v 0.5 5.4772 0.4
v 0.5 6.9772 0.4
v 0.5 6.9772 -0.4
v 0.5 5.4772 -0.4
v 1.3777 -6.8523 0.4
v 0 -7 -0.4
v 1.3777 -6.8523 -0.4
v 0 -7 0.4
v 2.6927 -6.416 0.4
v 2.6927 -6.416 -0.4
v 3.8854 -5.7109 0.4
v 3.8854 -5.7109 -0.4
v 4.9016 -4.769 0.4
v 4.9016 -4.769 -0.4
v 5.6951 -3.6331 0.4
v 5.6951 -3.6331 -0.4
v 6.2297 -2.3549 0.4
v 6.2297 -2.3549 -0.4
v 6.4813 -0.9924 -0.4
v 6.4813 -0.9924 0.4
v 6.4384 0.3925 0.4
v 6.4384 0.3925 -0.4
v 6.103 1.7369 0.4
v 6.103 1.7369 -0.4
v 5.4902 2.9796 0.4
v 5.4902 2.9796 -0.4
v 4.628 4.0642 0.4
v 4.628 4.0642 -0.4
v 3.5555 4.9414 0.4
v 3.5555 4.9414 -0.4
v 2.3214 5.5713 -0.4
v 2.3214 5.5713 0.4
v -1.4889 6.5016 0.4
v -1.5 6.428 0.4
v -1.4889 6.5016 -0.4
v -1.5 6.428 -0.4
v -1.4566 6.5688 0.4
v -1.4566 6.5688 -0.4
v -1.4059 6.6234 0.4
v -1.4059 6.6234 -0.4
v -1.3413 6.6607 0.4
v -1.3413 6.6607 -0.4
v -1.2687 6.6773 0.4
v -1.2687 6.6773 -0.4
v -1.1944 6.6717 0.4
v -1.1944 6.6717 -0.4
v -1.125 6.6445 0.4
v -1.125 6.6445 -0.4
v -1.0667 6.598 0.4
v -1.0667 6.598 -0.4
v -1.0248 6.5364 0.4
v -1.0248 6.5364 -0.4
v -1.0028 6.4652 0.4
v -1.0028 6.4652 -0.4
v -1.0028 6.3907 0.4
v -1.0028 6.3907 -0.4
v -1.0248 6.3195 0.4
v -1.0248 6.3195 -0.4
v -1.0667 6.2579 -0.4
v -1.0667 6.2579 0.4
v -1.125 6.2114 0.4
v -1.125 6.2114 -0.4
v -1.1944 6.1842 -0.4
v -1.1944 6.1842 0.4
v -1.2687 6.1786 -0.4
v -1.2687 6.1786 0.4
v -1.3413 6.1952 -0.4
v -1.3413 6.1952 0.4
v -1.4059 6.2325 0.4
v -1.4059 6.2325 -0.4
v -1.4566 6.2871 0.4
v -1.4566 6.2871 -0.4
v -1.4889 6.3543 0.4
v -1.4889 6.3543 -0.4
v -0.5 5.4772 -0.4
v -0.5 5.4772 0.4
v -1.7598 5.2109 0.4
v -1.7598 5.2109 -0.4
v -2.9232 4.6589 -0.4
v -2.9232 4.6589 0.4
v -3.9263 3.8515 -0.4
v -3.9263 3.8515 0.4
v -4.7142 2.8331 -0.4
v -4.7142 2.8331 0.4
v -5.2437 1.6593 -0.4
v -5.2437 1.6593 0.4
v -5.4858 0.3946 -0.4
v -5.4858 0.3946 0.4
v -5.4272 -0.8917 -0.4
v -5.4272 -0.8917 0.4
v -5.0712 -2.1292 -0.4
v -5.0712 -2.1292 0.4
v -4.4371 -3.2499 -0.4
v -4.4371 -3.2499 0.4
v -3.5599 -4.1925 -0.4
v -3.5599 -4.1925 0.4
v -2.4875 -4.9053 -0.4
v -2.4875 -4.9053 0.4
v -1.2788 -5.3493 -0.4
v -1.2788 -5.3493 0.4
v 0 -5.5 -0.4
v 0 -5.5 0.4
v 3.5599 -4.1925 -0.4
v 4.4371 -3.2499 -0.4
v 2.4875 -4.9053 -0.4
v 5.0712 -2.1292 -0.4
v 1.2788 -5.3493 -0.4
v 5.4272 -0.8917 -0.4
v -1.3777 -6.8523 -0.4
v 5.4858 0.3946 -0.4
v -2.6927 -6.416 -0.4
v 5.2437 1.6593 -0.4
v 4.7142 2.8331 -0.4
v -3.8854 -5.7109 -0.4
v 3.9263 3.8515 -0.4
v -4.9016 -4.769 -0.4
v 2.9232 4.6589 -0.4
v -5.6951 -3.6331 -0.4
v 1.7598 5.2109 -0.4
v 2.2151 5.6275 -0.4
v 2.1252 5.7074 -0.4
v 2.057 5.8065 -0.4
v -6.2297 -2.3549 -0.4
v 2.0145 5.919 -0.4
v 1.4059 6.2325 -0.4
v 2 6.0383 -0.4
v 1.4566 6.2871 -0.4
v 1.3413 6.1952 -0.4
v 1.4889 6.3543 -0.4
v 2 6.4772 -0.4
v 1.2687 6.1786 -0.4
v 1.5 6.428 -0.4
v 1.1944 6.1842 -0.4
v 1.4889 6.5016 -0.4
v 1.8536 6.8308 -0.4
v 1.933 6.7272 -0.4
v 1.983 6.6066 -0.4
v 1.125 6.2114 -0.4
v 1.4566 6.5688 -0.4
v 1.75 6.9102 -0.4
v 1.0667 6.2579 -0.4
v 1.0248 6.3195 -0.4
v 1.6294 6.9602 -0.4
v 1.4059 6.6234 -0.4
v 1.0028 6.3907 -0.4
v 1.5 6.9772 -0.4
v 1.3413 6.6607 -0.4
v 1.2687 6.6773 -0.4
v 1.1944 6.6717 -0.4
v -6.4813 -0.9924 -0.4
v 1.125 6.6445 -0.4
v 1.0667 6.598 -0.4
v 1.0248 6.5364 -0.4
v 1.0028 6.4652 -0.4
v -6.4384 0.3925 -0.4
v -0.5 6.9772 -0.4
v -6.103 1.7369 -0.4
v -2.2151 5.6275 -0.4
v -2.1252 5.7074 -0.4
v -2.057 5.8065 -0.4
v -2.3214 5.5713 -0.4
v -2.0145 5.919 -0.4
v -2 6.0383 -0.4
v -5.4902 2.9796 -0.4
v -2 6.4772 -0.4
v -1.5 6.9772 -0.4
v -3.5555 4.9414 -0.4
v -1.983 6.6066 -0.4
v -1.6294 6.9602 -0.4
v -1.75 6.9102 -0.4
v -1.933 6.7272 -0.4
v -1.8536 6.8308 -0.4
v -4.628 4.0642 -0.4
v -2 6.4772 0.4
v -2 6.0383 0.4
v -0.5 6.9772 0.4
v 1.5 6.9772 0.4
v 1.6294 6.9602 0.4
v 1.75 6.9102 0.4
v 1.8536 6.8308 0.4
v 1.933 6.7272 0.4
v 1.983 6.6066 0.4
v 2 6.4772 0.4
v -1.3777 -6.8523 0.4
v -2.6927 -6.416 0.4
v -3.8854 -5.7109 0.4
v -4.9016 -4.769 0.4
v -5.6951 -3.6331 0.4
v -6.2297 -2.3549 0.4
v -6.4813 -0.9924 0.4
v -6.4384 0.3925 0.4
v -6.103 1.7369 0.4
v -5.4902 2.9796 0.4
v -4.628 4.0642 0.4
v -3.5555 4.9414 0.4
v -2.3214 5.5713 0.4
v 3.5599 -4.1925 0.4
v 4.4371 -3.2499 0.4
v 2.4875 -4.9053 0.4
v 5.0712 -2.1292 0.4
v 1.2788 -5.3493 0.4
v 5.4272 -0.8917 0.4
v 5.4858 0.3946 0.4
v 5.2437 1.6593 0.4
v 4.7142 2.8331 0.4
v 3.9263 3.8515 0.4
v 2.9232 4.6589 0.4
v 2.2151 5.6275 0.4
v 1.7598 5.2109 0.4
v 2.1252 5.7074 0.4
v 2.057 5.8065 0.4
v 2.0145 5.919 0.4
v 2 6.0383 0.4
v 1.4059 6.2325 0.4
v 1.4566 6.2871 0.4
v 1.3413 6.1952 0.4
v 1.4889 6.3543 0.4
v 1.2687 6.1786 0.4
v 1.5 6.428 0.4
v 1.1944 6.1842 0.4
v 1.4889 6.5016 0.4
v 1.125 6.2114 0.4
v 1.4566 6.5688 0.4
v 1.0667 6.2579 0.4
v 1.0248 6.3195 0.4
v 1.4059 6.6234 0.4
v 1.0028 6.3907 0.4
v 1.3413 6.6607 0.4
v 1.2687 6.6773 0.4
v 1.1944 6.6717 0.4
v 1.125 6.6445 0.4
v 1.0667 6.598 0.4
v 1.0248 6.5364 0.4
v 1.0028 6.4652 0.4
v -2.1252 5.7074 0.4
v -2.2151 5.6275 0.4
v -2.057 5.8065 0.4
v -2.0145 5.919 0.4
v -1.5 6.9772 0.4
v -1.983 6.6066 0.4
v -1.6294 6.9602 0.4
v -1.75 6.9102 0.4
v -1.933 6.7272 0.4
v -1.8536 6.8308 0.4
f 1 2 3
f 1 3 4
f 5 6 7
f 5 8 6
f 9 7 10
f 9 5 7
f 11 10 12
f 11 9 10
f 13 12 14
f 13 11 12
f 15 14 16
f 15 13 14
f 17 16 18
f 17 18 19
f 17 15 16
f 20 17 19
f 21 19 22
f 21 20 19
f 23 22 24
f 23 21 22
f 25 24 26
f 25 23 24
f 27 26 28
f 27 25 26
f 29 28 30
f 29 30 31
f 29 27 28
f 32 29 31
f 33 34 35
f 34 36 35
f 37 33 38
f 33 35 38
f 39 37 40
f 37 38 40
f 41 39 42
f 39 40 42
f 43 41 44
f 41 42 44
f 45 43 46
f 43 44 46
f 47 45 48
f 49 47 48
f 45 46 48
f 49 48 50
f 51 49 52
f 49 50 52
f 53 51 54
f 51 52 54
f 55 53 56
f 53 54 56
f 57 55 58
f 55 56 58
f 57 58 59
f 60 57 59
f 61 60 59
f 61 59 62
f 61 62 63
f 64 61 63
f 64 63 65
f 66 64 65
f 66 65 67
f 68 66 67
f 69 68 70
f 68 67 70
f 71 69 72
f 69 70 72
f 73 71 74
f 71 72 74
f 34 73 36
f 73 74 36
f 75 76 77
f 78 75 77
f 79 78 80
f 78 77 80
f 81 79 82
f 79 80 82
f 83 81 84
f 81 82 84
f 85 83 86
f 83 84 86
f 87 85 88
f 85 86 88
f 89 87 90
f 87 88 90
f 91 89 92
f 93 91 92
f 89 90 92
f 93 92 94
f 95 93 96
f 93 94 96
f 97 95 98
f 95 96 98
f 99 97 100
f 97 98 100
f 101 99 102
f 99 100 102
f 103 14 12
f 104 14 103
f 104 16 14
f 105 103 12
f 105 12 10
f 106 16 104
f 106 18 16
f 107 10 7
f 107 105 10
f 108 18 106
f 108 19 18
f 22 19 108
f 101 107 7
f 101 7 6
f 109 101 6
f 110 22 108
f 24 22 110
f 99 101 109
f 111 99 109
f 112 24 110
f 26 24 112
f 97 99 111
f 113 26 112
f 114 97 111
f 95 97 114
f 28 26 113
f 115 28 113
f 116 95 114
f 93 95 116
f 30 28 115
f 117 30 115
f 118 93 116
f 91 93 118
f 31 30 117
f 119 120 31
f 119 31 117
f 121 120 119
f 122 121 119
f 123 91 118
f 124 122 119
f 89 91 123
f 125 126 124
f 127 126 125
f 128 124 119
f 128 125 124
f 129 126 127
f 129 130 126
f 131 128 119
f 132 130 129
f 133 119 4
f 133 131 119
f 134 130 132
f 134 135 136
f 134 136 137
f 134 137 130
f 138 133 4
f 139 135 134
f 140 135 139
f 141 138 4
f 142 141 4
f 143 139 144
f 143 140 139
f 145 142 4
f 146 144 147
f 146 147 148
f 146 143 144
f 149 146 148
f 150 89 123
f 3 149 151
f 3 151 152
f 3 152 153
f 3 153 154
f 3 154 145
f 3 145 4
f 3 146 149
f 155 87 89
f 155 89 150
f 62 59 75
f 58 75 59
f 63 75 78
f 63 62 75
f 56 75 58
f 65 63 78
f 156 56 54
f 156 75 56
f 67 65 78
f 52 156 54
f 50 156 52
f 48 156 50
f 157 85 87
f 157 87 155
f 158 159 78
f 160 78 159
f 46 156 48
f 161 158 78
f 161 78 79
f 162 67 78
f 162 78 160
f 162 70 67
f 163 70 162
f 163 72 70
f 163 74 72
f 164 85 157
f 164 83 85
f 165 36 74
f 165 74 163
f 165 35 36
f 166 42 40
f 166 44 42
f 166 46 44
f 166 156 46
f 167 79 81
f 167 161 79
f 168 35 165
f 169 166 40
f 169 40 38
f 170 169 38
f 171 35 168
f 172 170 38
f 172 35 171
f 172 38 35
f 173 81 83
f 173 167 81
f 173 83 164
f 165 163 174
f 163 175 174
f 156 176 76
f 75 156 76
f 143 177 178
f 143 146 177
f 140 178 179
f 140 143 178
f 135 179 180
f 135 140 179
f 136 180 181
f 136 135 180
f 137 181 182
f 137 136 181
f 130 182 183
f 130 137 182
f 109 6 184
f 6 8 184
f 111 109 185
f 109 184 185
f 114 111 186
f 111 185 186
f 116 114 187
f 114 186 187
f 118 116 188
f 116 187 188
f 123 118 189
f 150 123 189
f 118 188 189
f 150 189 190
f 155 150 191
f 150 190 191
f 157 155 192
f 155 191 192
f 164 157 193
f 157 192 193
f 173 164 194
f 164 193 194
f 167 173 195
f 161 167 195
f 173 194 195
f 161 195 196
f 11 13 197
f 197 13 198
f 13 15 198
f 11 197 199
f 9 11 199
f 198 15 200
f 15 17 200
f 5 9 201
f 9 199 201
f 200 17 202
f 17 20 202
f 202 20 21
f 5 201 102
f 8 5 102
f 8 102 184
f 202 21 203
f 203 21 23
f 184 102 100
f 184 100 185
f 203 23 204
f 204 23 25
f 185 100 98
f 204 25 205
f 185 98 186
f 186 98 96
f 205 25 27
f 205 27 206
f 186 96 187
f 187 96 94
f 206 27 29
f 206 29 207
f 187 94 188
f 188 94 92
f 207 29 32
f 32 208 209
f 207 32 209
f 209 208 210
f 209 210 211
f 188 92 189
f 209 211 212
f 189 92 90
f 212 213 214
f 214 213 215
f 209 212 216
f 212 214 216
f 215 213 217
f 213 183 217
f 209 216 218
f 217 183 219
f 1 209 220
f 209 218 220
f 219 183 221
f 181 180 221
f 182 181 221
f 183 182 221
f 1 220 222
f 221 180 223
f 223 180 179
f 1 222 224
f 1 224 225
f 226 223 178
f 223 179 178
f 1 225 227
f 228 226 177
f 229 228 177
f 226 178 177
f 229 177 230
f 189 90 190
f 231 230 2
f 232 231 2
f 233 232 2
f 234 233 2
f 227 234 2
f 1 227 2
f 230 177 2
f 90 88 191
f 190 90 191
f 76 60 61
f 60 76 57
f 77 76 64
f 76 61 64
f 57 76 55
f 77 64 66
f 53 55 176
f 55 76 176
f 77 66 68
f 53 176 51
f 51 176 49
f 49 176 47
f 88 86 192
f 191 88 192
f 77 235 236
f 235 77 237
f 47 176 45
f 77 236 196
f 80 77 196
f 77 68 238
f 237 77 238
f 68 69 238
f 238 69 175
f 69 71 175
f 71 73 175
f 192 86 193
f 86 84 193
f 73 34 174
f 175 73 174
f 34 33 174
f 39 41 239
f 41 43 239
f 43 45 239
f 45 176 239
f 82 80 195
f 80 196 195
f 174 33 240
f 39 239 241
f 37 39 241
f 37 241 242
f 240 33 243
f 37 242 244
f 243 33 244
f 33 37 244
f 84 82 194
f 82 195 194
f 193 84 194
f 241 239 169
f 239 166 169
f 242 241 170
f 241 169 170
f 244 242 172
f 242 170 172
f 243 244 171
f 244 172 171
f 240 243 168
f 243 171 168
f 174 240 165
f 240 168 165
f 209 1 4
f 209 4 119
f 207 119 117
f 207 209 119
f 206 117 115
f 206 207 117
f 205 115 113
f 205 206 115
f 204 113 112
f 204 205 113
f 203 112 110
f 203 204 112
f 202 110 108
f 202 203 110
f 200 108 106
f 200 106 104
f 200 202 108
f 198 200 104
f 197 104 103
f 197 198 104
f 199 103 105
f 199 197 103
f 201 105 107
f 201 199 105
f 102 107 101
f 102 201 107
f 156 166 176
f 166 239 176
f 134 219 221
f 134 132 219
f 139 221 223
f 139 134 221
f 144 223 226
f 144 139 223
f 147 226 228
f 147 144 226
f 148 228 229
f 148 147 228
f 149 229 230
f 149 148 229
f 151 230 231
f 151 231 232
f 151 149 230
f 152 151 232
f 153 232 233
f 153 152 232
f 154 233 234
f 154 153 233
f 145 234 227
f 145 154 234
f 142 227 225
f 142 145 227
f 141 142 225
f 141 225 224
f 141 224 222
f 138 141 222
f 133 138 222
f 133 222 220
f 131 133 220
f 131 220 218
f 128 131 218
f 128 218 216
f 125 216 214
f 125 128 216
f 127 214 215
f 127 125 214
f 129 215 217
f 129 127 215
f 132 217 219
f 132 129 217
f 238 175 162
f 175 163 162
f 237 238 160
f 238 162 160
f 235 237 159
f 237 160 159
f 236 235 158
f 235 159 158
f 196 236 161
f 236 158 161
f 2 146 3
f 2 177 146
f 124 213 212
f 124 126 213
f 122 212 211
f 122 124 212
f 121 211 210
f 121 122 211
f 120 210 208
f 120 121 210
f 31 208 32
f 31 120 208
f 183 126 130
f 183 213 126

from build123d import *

# Parameters (mm, degrees)
SKETCH_1_R             = 0.25
EXTRUDE_1_DEPTH        = 0.4
FILLET_1_R             = 0.5
FILLET_1_OF_MIRROR_1_R = 0.5


with BuildPart() as part:
    # Эскиз1 → Бобышка-Вытянуть1 (new body, symmetric)
    with BuildSketch(Plane.XY):
        with BuildLine():
            Line((2, 6.977225575), (0.5, 6.977225575))
            Line((0.5, 6.977225575), (0.5, 5.980740698))
            ThreePointArc((0.5, 5.980740698), (1.258735944, 5.876957254), (2, 5.684658438))
            Line((2, 5.684658438), (2, 6.977225575))
        make_face()
        with Locations((1.25, 6.427950493)):
            Circle(SKETCH_1_R, mode=Mode.SUBTRACT)
        with BuildLine():
            ThreePointArc((2, 5.684658438), (1.258735944, 5.876957254), (0.5, 5.980740698))
            Line((0.5, 5.980740698), (0.5, 5.477225575))
            ThreePointArc((0.5, 5.477225575), (5.494303444, -0.250259203), (0, -5.5))
            Line((0, -5.5), (0, -7))
            ThreePointArc((0, -7), (6.420680643, -1.51235373), (2, 5.684658438))
        make_face()
    extrude_1 = extrude(amount=EXTRUDE_1_DEPTH, both=True)

    # Скругление1
    fillet_1_edges = [part.edges().sort_by_distance(p)[0] for p in [
        (2, 6.977225575, 0),
        (2, 5.684658438, 0),
    ]]
    fillet(fillet_1_edges, radius=FILLET_1_R)

    # Зеркальное отражение1: Бобышка-Вытянуть1 across plane
    add(extrude_1.mirror(Plane(origin=(0, 0, 0.4), x_dir=(0, 0, 1), z_dir=(1, 0, 0))))

    # Скругление1 of Зеркальное отражение1
    fillet_1_of_mirror_1_edges = [part.edges().sort_by_distance(p)[0] for p in [
        (-2, 6.977225575, 0),
        (-2, 5.684658438, 0),
    ]]
    fillet(fillet_1_of_mirror_1_edges, radius=FILLET_1_OF_MIRROR_1_R)


solid = part.part
